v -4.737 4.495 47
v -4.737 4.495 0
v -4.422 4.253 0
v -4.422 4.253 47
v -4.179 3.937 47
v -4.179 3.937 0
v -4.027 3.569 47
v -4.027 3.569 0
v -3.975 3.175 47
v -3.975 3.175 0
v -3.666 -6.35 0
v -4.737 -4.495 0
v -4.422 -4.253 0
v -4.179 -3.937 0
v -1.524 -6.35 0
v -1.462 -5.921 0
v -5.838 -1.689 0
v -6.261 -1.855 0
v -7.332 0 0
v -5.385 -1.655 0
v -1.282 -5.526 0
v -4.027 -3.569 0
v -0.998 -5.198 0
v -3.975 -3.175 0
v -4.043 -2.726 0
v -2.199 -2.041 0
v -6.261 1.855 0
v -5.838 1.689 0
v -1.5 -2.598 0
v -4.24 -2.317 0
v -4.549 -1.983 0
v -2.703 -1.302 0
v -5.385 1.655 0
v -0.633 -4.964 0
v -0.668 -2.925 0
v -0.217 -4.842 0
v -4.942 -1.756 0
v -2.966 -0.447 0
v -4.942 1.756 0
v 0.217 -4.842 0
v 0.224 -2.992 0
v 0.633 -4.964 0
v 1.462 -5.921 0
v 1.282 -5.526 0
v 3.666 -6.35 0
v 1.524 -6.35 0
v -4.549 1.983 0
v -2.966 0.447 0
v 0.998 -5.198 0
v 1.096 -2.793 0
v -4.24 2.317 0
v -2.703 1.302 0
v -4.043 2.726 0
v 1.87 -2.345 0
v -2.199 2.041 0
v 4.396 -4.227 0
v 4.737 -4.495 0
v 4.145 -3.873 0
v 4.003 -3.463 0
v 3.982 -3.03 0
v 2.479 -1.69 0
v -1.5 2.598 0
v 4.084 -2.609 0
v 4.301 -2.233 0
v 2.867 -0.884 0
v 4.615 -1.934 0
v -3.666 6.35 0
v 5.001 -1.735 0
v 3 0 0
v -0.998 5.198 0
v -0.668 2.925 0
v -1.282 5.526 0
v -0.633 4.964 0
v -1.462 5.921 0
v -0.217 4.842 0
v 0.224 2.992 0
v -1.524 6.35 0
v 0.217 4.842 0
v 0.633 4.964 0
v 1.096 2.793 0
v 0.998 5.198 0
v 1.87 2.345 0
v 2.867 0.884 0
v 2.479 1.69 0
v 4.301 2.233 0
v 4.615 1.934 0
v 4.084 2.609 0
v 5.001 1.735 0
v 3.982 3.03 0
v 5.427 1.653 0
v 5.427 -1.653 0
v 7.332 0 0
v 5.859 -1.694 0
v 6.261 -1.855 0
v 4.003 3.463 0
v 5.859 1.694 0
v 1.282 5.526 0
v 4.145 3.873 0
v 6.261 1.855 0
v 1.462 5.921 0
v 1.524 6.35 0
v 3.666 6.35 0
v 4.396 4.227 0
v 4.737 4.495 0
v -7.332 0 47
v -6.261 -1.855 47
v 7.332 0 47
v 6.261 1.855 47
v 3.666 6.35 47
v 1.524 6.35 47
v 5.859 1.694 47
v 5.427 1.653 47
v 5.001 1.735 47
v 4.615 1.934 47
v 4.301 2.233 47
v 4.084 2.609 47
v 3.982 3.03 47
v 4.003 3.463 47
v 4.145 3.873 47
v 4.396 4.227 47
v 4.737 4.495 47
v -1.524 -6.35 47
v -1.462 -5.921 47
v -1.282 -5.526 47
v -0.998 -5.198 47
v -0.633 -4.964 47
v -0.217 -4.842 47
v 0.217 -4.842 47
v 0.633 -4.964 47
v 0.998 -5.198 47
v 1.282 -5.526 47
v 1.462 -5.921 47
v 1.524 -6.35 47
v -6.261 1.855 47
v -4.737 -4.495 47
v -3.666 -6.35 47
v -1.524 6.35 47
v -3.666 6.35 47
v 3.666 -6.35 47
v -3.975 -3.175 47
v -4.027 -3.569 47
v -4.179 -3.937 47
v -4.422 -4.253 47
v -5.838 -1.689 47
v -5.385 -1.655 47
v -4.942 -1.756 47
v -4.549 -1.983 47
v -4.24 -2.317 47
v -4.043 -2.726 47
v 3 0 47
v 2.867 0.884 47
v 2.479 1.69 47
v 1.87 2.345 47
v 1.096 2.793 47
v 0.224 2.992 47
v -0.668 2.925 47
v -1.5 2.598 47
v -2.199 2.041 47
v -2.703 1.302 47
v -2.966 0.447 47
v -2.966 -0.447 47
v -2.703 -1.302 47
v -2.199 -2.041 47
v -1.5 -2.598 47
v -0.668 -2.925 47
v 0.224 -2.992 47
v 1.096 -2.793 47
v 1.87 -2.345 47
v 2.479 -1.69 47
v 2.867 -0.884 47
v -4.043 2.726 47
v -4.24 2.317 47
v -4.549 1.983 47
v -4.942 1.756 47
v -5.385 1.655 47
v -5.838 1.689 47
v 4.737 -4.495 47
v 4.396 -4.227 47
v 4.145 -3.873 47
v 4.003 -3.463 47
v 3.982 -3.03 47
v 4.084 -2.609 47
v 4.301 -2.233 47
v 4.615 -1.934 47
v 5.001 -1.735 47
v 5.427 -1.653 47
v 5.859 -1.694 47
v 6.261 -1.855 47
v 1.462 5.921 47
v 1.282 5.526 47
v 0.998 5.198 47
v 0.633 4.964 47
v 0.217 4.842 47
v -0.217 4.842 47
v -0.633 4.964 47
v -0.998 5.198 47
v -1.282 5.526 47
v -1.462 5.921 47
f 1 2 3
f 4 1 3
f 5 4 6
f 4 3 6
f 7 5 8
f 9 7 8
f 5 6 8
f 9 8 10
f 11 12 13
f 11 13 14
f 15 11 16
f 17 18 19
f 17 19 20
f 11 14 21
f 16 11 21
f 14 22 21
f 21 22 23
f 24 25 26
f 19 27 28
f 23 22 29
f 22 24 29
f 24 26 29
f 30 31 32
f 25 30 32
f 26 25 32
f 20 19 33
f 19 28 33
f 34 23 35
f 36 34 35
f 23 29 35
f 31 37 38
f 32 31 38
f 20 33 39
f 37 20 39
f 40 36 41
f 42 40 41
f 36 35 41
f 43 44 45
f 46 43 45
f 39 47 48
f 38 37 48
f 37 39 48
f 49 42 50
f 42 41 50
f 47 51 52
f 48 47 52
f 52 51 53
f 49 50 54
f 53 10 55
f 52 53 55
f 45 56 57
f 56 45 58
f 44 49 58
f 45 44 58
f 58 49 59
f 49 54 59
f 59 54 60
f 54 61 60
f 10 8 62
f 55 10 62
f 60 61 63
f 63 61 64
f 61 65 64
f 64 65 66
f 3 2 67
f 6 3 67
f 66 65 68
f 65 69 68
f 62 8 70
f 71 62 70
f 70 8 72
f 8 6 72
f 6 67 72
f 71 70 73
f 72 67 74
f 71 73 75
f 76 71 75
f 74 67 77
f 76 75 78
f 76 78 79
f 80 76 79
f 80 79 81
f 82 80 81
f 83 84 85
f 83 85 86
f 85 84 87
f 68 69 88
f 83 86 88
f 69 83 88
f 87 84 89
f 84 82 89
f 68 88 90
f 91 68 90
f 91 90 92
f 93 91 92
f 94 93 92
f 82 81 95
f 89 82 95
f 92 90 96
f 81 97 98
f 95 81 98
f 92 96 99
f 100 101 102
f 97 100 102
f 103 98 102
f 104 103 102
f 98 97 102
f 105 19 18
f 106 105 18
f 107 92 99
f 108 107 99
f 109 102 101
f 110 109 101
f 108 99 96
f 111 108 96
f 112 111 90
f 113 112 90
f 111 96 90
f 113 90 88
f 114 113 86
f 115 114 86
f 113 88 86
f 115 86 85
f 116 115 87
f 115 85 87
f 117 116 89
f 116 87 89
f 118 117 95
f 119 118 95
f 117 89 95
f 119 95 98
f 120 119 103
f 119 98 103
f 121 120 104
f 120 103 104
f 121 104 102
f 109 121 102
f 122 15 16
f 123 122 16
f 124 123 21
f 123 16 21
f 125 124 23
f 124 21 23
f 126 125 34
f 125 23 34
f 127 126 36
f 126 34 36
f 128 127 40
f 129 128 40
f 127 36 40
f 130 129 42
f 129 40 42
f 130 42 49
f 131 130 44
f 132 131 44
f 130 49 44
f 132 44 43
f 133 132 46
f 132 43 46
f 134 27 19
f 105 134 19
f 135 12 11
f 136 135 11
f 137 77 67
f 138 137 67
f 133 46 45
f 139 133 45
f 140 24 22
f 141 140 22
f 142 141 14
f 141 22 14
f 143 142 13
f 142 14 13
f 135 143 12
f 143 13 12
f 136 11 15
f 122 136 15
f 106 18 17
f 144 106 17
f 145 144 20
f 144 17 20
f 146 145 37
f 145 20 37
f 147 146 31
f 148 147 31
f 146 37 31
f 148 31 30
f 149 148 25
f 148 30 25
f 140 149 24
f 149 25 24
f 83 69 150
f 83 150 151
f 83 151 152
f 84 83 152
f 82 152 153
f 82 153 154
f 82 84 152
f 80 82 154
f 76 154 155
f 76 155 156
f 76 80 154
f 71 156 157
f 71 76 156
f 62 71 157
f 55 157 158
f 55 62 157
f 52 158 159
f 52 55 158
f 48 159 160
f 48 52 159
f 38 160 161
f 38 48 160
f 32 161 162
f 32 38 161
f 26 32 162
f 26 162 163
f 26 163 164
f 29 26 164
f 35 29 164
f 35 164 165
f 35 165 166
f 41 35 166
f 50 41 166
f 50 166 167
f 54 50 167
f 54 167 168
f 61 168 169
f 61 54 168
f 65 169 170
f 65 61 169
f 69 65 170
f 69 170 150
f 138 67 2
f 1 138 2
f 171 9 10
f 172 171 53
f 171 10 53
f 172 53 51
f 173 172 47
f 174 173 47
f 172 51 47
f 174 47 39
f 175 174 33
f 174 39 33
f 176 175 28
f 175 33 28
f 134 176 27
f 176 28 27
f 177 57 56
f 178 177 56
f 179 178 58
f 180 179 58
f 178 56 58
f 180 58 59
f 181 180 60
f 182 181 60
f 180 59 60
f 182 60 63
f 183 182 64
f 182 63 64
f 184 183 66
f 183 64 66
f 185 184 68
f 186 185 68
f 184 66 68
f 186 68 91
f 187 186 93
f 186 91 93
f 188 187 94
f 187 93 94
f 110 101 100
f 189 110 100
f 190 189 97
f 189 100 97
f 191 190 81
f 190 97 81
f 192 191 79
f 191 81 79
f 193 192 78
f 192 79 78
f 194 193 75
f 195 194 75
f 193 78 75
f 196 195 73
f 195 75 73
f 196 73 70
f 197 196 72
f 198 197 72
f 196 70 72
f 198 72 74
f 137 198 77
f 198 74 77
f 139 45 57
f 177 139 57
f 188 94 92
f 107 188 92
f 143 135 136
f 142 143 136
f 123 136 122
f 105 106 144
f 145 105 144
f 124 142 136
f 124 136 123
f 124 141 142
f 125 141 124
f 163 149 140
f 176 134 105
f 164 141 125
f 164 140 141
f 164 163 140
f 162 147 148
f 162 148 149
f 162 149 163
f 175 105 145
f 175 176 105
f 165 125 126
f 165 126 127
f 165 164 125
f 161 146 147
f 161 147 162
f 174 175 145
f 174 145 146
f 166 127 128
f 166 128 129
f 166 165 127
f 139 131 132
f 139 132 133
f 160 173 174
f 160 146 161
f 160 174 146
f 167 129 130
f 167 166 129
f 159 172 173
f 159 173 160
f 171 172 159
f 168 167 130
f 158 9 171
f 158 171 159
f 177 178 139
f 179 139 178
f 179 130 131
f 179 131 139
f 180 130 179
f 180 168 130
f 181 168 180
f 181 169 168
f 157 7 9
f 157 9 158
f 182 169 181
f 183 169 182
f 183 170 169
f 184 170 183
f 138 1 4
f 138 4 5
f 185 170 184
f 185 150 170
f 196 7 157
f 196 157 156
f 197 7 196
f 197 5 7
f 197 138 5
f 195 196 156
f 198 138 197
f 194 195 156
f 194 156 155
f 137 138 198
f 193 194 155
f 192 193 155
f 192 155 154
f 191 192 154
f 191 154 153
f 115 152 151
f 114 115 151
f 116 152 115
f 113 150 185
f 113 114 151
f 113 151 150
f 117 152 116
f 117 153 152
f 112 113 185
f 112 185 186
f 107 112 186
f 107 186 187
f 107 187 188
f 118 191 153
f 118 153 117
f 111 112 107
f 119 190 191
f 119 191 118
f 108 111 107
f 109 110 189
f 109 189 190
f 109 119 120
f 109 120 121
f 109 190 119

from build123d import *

# Parameters (mm, degrees)
ESBO_O1_R                = 3
RESSALTO_EXTRUS_O1_DEPTH = 47


with BuildPart() as part:
    # Esboço1 → Ressalto-extrusão1 (new body)
    with BuildSketch(Plane.XY):
        with BuildLine():
            Line((4.737261314, 4.494822715), (3.666174209, 6.35))
            Line((3.666174209, 6.35), (1.524, 6.35))
            ThreePointArc((1.524, 6.35), (0, 4.826), (-1.524, 6.35))
            Line((-1.524, 6.35), (-3.666174209, 6.35))
            Line((-3.666174209, 6.35), (-4.737261314, 4.494822715))
            ThreePointArc((-4.737261314, 4.494822715), (-4.179438599, 3.937), (-3.975261314, 3.175))
            ThreePointArc((-3.975261314, 3.175), (-4.737261314, 1.855177285), (-6.261261314, 1.855177285))
            Line((-6.261261314, 1.855177285), (-7.332348419, 0))
            Line((-7.332348419, 0), (-6.261261314, -1.855177285))
            ThreePointArc((-6.261261314, -1.855177285), (-4.737261314, -1.855177285), (-3.975261314, -3.175))
            ThreePointArc((-3.975261314, -3.175), (-4.179438599, -3.937), (-4.737261314, -4.494822715))
            Line((-4.737261314, -4.494822715), (-3.666174209, -6.35))
            Line((-3.666174209, -6.35), (-1.524, -6.35))
            ThreePointArc((-1.524, -6.35), (0, -4.826), (1.524, -6.35))
            Line((1.524, -6.35), (3.666174209, -6.35))
            Line((3.666174209, -6.35), (4.737261314, -4.494822715))
            ThreePointArc((4.737261314, -4.494822715), (4.179438599, -2.413), (6.261261314, -1.855177285))
            Line((6.261261314, -1.855177285), (7.332348419, 0))
            Line((7.332348419, 0), (6.261261314, 1.855177285))
            ThreePointArc((6.261261314, 1.855177285), (4.179438599, 2.413), (4.737261314, 4.494822715))
        make_face()
        Circle(ESBO_O1_R, mode=Mode.SUBTRACT)
    extrude(amount=RESSALTO_EXTRUS_O1_DEPTH)


solid = part.part
